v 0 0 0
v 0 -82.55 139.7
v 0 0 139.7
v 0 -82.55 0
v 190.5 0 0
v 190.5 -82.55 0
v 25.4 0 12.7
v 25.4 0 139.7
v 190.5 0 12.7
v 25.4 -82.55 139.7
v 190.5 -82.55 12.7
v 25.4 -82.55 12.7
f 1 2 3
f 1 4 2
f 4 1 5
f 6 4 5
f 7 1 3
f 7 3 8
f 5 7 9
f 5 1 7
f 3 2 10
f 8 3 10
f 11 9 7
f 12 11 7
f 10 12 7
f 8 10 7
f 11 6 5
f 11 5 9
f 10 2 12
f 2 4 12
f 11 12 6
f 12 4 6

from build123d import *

# Parameters (mm, degrees)
F1_DEPTH = 82.55
F2_W     = 25.4
F2_H     = 82.55
F3_DEPTH = 127


with BuildPart() as f1:
    # F0 (on Front) → F1 (new body)
    with BuildSketch(Plane.XZ):
        Polygon((0, 12.7), (0, 0), (190.5, 0), (190.5, 12.7), (38.1, 12.7), align=None)
    extrude(amount=F1_DEPTH)

    # F2 (on face) → F3 (join)
    with BuildSketch(Plane.XY.offset(12.7)):
        with Locations((12.7, -41.275)):
            Rectangle(F2_W, F2_H)
    extrude(amount=F3_DEPTH)


solid = f1.part
